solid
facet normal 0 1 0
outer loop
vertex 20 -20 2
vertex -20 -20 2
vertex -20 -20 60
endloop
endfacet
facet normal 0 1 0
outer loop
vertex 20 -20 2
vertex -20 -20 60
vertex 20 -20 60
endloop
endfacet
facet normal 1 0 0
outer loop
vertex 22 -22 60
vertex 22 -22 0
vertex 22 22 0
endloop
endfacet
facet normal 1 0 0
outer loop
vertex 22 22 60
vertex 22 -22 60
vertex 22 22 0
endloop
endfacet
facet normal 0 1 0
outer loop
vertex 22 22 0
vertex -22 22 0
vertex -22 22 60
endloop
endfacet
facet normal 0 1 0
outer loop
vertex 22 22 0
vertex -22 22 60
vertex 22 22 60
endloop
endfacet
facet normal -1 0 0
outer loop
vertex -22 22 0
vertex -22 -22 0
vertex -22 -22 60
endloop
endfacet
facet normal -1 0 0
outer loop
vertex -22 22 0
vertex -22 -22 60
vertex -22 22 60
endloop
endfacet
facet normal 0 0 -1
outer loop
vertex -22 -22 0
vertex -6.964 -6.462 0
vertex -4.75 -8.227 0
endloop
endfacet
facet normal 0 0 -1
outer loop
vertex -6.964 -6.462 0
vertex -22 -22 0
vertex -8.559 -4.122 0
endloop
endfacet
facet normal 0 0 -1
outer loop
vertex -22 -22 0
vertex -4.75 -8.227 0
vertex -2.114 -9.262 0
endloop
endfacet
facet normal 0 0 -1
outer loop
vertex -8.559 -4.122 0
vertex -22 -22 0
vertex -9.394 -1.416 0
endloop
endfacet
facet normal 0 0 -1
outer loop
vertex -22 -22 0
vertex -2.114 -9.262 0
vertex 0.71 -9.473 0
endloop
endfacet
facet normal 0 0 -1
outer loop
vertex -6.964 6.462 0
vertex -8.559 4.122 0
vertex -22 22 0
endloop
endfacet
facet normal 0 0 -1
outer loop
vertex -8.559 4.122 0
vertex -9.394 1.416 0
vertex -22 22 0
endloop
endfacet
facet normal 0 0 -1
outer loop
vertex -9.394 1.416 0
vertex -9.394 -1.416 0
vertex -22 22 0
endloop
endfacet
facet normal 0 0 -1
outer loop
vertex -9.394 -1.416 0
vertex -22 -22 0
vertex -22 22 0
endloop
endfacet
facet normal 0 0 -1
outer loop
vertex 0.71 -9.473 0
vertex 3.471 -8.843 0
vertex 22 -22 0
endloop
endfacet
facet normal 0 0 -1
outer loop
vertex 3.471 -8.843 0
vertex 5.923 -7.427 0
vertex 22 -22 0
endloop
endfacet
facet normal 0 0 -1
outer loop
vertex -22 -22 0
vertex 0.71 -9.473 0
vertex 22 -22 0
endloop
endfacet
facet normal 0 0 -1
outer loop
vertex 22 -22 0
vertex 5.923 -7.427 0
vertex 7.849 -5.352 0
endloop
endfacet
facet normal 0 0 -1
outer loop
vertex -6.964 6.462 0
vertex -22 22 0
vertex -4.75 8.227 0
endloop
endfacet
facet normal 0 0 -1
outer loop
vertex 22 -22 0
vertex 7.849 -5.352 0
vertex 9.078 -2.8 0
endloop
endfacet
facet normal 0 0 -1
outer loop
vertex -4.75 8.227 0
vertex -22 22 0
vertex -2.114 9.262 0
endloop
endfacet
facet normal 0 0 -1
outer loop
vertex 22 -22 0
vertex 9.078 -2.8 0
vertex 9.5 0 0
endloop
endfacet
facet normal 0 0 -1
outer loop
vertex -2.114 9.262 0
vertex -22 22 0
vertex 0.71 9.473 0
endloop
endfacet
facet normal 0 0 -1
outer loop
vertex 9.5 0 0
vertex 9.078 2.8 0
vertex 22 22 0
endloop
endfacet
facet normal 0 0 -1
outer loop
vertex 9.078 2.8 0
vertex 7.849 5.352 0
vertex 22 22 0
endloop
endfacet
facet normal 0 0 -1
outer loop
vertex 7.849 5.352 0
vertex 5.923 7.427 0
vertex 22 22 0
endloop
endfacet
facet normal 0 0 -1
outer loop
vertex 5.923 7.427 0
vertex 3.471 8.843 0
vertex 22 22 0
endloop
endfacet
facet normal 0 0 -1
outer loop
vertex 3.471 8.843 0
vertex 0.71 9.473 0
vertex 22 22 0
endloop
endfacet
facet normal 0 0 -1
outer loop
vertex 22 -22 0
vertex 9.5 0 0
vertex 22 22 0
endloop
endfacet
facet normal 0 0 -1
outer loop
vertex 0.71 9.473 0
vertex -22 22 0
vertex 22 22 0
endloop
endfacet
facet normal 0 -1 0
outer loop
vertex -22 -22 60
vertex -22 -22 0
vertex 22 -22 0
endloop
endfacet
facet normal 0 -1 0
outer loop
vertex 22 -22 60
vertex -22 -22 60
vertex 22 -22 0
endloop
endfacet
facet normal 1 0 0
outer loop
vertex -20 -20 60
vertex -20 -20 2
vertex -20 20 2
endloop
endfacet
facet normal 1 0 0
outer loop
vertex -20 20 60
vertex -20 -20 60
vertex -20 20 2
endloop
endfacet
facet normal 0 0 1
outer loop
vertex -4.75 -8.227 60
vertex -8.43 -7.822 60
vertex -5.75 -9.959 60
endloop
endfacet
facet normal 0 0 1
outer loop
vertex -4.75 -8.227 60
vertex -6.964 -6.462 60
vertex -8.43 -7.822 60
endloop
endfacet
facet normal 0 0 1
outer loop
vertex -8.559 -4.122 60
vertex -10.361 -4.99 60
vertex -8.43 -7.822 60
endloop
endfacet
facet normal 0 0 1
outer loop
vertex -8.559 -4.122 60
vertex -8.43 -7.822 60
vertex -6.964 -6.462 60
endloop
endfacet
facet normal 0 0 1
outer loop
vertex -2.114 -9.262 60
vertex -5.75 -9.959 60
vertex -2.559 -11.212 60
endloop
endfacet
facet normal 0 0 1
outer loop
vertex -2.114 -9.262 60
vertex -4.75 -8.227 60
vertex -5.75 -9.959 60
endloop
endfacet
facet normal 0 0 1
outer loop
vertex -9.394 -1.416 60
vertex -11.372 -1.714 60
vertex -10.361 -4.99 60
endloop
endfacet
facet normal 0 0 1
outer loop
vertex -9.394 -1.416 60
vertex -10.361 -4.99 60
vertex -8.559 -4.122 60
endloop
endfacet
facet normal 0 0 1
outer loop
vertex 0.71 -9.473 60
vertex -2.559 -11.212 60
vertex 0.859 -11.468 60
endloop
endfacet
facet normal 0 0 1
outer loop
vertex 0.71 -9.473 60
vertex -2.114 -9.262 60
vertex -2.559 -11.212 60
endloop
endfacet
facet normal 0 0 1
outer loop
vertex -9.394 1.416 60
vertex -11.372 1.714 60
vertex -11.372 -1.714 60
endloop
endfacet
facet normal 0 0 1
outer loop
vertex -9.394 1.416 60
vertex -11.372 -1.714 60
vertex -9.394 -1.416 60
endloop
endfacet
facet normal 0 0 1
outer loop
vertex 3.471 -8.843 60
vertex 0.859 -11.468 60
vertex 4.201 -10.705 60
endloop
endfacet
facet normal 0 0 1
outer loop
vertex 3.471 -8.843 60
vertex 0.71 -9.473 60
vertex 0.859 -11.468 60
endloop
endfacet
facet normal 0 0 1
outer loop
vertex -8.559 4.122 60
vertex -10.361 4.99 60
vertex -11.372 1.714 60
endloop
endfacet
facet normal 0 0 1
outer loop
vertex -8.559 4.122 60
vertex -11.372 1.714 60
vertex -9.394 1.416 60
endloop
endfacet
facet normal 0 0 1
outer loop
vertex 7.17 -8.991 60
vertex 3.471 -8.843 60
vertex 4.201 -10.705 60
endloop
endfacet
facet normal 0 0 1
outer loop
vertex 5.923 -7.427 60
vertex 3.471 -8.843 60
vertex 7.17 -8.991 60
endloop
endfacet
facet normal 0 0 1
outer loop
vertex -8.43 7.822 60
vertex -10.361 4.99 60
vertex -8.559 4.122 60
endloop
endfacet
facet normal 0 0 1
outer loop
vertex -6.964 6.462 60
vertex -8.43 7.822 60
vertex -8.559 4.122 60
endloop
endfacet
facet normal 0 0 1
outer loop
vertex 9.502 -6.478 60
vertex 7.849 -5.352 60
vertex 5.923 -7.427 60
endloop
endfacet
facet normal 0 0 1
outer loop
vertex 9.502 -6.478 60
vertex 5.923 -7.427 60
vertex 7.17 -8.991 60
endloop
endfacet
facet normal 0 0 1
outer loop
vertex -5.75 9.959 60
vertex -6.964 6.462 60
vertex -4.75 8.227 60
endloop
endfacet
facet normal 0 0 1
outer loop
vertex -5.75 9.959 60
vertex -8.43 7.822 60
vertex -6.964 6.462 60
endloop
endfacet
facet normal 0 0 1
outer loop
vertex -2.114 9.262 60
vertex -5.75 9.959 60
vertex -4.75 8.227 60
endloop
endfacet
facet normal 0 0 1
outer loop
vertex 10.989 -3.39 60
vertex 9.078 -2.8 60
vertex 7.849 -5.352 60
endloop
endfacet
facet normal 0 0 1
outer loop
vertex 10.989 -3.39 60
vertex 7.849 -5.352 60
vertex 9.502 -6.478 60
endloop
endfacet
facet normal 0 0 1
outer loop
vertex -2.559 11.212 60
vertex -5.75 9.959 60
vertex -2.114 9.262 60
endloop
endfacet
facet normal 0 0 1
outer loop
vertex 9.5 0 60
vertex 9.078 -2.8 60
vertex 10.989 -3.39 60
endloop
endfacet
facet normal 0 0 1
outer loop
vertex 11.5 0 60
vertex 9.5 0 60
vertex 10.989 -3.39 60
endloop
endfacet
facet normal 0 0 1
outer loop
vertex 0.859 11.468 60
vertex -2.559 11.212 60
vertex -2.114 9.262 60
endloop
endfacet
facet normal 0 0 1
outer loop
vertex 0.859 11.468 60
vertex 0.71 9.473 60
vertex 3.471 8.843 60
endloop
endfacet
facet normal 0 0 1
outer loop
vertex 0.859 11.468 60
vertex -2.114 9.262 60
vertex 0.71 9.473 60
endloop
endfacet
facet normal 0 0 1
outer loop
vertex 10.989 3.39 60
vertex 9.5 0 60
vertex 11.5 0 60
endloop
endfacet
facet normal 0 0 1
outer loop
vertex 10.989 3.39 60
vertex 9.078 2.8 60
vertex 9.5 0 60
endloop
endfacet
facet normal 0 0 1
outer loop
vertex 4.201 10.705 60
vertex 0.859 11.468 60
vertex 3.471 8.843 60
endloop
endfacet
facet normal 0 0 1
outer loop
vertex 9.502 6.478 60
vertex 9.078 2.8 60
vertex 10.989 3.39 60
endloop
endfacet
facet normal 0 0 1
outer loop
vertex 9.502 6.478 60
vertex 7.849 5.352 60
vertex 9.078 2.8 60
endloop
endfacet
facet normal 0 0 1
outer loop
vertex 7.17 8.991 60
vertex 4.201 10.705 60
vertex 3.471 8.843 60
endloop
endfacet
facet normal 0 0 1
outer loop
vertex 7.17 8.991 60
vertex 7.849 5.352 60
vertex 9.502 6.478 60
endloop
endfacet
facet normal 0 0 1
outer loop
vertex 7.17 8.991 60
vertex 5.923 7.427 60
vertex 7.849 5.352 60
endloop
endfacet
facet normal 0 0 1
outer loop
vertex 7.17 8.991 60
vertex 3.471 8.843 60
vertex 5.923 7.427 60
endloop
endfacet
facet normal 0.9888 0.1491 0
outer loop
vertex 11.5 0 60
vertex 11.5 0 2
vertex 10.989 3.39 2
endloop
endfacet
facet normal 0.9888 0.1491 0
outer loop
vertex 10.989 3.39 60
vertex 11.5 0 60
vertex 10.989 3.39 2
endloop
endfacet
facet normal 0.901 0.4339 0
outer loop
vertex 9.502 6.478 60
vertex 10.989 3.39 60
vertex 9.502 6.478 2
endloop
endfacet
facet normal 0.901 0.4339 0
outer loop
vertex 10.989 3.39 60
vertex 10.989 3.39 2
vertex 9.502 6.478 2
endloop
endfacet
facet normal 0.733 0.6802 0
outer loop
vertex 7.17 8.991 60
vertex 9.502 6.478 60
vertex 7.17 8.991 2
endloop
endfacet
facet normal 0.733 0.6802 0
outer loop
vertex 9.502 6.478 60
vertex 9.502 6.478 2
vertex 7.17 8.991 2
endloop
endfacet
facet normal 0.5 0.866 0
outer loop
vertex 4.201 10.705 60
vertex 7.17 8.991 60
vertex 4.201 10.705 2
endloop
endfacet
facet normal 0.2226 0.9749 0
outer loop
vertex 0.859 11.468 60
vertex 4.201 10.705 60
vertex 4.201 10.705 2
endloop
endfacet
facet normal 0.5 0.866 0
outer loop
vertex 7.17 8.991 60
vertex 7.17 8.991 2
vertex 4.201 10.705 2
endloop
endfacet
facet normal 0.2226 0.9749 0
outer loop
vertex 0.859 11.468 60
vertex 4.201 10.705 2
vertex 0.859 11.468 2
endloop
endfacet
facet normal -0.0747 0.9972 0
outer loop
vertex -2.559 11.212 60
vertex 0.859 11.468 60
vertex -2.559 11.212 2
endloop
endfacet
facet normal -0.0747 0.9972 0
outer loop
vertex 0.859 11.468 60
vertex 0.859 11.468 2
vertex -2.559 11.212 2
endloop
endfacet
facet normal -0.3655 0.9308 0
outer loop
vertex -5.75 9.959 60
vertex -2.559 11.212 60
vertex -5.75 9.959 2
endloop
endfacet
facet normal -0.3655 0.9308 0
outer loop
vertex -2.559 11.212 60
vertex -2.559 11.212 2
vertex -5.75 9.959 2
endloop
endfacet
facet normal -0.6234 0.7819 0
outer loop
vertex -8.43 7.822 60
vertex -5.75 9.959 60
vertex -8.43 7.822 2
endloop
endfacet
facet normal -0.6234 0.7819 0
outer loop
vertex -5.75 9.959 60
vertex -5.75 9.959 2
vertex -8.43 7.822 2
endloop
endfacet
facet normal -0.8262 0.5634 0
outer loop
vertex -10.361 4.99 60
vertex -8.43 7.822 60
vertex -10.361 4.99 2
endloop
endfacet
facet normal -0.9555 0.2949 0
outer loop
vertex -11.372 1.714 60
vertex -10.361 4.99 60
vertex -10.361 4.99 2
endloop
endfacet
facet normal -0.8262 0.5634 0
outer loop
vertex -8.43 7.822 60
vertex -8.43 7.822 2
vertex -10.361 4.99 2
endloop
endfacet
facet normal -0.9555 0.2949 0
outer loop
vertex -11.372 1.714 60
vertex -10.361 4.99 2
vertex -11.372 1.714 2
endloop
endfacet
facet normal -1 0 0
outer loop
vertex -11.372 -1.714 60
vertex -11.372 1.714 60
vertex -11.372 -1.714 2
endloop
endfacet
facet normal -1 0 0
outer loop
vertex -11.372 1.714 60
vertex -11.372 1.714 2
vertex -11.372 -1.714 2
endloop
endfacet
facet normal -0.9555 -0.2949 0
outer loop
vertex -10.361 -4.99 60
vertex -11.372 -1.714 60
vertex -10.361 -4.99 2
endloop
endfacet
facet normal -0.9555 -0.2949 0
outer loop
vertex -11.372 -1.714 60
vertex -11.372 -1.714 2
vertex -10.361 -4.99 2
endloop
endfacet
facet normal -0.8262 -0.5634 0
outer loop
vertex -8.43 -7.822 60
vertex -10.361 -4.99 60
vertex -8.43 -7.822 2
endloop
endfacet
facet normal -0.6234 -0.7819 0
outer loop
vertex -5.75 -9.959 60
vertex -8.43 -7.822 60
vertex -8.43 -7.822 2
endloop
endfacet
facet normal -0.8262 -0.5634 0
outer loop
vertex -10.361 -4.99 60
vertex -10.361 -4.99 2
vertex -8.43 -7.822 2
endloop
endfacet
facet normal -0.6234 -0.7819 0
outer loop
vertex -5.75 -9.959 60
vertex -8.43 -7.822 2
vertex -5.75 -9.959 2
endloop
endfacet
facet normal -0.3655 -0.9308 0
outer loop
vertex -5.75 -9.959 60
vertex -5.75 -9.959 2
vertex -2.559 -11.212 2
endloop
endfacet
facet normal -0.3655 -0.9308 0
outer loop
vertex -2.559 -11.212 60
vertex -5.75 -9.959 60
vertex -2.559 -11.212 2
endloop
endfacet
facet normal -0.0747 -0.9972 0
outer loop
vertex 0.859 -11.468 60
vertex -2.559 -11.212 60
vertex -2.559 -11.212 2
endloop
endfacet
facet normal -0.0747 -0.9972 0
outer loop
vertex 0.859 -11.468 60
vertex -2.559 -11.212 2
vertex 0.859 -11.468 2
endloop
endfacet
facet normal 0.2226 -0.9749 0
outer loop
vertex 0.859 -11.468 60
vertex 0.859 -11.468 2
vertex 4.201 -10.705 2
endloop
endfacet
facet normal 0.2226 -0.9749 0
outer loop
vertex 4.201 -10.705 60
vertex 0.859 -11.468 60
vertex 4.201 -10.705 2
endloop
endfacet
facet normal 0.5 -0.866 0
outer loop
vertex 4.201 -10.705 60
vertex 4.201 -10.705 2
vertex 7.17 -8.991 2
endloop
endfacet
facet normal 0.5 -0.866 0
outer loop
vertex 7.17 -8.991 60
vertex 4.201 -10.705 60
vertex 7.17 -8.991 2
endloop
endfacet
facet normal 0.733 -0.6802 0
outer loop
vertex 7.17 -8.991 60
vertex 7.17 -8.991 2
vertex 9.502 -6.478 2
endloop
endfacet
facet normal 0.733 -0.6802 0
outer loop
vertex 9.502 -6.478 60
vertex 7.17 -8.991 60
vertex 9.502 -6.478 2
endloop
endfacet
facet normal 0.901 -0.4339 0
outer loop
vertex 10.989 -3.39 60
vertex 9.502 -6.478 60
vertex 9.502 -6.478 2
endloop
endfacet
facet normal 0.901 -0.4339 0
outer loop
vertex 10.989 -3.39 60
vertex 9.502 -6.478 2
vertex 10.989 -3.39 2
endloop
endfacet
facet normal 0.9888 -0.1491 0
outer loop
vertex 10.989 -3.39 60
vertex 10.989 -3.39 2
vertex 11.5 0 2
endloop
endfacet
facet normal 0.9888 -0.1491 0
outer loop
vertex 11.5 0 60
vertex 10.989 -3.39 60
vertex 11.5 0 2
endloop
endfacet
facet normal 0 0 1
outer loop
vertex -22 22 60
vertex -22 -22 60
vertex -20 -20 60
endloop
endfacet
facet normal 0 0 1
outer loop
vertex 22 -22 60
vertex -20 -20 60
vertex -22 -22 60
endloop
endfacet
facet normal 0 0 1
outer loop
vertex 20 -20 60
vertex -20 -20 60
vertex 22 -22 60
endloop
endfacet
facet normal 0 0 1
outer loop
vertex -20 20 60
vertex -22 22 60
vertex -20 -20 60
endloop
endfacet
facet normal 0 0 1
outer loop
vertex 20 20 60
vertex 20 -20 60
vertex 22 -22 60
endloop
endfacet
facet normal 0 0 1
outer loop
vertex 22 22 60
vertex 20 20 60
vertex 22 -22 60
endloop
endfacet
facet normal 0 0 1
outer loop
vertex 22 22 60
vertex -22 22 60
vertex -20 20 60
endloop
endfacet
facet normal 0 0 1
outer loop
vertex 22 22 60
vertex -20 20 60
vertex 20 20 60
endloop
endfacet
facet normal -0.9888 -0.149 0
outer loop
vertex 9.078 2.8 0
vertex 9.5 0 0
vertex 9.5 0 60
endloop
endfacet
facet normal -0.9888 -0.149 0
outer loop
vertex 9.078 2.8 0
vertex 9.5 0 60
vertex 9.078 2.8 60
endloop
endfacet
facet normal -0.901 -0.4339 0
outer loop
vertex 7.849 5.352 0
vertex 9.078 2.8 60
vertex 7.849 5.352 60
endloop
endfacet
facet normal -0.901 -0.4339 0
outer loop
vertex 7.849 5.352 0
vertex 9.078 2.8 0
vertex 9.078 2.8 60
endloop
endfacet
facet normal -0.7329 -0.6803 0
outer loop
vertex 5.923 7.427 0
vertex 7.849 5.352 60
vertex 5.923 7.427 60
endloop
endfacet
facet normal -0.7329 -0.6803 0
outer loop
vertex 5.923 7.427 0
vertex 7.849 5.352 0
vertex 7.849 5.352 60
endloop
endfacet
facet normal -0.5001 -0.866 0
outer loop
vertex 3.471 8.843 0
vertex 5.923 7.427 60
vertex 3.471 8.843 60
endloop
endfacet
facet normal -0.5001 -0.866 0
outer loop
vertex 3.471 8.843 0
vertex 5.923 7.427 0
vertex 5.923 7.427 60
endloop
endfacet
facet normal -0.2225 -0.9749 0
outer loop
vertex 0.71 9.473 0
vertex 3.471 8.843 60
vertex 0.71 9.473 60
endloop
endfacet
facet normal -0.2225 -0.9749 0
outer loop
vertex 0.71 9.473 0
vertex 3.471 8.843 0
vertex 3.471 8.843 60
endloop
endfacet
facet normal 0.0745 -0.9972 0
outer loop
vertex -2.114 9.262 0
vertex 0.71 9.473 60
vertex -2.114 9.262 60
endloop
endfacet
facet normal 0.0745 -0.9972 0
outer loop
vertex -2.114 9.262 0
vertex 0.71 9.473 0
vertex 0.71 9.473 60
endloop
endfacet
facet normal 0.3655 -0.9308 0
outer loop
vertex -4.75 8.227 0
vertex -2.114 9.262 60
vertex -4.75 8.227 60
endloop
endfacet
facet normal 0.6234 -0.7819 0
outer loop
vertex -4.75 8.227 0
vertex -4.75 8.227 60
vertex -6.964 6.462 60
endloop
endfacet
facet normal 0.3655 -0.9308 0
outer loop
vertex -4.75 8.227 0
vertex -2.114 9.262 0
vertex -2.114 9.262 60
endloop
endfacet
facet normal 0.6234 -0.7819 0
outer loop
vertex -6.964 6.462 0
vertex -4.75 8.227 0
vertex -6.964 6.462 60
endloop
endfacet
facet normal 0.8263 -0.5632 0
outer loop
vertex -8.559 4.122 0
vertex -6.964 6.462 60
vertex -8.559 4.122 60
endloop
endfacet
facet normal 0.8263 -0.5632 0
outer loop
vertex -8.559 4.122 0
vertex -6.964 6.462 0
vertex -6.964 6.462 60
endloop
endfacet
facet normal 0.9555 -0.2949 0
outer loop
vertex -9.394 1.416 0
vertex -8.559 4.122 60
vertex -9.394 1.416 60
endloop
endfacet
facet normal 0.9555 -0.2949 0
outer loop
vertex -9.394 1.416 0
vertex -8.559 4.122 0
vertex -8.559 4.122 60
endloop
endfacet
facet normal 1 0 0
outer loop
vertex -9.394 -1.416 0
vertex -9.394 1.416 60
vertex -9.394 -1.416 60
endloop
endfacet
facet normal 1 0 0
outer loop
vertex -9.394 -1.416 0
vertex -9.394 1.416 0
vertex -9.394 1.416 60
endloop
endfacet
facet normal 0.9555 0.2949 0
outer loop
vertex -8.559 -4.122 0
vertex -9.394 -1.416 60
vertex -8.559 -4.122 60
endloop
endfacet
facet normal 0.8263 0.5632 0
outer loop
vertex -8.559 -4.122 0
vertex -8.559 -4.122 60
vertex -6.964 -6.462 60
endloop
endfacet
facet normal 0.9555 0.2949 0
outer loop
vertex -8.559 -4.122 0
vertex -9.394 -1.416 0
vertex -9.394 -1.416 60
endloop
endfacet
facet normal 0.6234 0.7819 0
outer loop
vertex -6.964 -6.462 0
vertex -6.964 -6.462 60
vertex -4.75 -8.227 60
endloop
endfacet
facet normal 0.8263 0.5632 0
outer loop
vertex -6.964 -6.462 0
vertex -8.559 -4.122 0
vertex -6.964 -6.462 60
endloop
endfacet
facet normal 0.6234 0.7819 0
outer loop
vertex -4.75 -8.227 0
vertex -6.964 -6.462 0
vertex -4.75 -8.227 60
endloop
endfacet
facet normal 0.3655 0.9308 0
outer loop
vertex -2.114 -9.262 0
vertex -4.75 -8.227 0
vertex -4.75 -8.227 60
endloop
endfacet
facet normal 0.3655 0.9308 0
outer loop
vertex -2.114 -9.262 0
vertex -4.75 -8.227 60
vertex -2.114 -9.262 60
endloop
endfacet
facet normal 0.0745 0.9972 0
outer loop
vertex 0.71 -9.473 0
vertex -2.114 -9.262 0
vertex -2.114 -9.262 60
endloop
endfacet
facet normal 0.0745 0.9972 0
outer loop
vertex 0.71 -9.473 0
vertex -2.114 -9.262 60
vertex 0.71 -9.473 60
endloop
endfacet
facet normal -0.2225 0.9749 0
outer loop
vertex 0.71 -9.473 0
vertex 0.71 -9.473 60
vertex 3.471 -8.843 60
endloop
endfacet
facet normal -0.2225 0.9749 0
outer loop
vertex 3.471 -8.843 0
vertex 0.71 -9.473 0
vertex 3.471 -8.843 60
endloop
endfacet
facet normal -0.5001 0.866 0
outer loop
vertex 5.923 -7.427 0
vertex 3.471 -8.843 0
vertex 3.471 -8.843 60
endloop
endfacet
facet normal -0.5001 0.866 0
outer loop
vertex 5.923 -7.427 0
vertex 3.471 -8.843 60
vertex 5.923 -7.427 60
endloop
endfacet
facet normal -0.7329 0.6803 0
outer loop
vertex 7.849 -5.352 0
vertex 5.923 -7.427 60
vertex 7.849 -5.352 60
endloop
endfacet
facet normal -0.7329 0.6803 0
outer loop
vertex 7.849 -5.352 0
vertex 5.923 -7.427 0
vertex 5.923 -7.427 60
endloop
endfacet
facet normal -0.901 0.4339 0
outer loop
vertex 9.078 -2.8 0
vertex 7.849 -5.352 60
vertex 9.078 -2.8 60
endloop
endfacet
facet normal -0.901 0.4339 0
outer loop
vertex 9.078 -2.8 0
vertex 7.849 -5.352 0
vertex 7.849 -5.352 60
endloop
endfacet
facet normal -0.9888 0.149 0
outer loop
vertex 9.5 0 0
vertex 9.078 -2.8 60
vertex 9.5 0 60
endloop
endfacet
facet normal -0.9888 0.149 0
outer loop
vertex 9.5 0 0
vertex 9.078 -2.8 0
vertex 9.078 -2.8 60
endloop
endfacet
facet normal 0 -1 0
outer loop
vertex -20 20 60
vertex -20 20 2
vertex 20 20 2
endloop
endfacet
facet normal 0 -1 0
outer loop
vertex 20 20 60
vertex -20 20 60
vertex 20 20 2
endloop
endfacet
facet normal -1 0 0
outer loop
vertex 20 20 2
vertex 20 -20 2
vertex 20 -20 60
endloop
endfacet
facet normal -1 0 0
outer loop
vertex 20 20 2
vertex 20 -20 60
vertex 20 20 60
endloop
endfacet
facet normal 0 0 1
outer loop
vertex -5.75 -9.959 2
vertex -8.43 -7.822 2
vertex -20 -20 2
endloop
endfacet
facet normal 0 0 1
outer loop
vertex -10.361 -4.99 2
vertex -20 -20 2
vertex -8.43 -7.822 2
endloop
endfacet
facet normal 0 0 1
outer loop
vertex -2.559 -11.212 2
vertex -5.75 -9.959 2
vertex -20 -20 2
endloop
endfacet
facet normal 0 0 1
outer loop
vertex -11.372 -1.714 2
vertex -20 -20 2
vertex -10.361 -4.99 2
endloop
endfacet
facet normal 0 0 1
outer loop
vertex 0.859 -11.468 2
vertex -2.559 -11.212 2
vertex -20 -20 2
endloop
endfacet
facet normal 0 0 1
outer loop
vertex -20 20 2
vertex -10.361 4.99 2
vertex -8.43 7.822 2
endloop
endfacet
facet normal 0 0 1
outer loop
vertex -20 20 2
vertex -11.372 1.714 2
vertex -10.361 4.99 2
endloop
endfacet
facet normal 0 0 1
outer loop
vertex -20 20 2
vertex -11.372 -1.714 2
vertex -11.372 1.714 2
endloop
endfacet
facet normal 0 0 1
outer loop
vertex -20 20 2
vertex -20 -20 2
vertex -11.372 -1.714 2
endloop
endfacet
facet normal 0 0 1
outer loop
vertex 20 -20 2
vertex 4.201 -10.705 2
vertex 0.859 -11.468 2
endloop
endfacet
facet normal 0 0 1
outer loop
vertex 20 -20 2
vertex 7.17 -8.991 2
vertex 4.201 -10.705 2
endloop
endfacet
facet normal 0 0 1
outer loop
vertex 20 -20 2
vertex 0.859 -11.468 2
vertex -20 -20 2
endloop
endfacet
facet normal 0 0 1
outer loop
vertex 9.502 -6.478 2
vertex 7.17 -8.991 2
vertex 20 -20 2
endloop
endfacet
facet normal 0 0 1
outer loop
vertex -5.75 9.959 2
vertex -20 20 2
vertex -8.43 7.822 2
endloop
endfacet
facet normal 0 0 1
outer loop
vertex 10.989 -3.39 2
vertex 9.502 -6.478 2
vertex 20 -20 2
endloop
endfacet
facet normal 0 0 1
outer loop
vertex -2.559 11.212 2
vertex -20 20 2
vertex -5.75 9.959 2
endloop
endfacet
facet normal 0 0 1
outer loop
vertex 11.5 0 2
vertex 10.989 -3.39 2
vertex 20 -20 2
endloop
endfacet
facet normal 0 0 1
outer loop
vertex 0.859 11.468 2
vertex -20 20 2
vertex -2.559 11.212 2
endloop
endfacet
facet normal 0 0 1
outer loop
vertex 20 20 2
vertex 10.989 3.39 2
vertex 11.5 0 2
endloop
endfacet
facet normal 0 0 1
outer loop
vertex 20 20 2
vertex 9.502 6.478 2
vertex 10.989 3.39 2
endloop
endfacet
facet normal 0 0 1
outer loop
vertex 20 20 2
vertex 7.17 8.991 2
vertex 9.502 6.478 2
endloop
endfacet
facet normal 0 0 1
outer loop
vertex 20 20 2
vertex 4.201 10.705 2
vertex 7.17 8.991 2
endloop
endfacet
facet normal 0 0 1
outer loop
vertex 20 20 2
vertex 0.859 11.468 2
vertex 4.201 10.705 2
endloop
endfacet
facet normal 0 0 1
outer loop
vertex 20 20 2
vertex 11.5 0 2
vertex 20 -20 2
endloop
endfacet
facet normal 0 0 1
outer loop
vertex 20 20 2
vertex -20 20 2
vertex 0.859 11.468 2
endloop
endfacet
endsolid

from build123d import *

# Parameters (mm, degrees)
F0_R     = 11.5
F0_R_2   = 9.5
F1_DEPTH = 60
F0_W     = 44
F0_H     = 44
F0_W_2   = 40
F0_H_2   = 40
F2_DEPTH = 60
F3_DEPTH = 2


with BuildPart() as f1:
    # F0 (on Top) → F1 (new body)
    with BuildSketch(Plane.XY):
        Circle(F0_R)
        Circle(F0_R_2, mode=Mode.SUBTRACT)
    extrude(amount=F1_DEPTH)



with BuildPart() as f2:
    # F0 (on Top) → F2 (new body)
    with BuildSketch(Plane.XY):
        Rectangle(F0_W, F0_H)
        Rectangle(F0_W_2, F0_H_2, mode=Mode.SUBTRACT)
    extrude(amount=F2_DEPTH)


with BuildPart() as f1_1:
    add(f1.part)

    add(f2.part)  # F3 merges F2
    # F0 (on Top) → F3 (join)
    with BuildSketch(Plane.XY):
        Rectangle(F0_W_2, F0_H_2)
        Circle(F0_R, mode=Mode.SUBTRACT)
    extrude(amount=F3_DEPTH)


solid = f1_1.part
